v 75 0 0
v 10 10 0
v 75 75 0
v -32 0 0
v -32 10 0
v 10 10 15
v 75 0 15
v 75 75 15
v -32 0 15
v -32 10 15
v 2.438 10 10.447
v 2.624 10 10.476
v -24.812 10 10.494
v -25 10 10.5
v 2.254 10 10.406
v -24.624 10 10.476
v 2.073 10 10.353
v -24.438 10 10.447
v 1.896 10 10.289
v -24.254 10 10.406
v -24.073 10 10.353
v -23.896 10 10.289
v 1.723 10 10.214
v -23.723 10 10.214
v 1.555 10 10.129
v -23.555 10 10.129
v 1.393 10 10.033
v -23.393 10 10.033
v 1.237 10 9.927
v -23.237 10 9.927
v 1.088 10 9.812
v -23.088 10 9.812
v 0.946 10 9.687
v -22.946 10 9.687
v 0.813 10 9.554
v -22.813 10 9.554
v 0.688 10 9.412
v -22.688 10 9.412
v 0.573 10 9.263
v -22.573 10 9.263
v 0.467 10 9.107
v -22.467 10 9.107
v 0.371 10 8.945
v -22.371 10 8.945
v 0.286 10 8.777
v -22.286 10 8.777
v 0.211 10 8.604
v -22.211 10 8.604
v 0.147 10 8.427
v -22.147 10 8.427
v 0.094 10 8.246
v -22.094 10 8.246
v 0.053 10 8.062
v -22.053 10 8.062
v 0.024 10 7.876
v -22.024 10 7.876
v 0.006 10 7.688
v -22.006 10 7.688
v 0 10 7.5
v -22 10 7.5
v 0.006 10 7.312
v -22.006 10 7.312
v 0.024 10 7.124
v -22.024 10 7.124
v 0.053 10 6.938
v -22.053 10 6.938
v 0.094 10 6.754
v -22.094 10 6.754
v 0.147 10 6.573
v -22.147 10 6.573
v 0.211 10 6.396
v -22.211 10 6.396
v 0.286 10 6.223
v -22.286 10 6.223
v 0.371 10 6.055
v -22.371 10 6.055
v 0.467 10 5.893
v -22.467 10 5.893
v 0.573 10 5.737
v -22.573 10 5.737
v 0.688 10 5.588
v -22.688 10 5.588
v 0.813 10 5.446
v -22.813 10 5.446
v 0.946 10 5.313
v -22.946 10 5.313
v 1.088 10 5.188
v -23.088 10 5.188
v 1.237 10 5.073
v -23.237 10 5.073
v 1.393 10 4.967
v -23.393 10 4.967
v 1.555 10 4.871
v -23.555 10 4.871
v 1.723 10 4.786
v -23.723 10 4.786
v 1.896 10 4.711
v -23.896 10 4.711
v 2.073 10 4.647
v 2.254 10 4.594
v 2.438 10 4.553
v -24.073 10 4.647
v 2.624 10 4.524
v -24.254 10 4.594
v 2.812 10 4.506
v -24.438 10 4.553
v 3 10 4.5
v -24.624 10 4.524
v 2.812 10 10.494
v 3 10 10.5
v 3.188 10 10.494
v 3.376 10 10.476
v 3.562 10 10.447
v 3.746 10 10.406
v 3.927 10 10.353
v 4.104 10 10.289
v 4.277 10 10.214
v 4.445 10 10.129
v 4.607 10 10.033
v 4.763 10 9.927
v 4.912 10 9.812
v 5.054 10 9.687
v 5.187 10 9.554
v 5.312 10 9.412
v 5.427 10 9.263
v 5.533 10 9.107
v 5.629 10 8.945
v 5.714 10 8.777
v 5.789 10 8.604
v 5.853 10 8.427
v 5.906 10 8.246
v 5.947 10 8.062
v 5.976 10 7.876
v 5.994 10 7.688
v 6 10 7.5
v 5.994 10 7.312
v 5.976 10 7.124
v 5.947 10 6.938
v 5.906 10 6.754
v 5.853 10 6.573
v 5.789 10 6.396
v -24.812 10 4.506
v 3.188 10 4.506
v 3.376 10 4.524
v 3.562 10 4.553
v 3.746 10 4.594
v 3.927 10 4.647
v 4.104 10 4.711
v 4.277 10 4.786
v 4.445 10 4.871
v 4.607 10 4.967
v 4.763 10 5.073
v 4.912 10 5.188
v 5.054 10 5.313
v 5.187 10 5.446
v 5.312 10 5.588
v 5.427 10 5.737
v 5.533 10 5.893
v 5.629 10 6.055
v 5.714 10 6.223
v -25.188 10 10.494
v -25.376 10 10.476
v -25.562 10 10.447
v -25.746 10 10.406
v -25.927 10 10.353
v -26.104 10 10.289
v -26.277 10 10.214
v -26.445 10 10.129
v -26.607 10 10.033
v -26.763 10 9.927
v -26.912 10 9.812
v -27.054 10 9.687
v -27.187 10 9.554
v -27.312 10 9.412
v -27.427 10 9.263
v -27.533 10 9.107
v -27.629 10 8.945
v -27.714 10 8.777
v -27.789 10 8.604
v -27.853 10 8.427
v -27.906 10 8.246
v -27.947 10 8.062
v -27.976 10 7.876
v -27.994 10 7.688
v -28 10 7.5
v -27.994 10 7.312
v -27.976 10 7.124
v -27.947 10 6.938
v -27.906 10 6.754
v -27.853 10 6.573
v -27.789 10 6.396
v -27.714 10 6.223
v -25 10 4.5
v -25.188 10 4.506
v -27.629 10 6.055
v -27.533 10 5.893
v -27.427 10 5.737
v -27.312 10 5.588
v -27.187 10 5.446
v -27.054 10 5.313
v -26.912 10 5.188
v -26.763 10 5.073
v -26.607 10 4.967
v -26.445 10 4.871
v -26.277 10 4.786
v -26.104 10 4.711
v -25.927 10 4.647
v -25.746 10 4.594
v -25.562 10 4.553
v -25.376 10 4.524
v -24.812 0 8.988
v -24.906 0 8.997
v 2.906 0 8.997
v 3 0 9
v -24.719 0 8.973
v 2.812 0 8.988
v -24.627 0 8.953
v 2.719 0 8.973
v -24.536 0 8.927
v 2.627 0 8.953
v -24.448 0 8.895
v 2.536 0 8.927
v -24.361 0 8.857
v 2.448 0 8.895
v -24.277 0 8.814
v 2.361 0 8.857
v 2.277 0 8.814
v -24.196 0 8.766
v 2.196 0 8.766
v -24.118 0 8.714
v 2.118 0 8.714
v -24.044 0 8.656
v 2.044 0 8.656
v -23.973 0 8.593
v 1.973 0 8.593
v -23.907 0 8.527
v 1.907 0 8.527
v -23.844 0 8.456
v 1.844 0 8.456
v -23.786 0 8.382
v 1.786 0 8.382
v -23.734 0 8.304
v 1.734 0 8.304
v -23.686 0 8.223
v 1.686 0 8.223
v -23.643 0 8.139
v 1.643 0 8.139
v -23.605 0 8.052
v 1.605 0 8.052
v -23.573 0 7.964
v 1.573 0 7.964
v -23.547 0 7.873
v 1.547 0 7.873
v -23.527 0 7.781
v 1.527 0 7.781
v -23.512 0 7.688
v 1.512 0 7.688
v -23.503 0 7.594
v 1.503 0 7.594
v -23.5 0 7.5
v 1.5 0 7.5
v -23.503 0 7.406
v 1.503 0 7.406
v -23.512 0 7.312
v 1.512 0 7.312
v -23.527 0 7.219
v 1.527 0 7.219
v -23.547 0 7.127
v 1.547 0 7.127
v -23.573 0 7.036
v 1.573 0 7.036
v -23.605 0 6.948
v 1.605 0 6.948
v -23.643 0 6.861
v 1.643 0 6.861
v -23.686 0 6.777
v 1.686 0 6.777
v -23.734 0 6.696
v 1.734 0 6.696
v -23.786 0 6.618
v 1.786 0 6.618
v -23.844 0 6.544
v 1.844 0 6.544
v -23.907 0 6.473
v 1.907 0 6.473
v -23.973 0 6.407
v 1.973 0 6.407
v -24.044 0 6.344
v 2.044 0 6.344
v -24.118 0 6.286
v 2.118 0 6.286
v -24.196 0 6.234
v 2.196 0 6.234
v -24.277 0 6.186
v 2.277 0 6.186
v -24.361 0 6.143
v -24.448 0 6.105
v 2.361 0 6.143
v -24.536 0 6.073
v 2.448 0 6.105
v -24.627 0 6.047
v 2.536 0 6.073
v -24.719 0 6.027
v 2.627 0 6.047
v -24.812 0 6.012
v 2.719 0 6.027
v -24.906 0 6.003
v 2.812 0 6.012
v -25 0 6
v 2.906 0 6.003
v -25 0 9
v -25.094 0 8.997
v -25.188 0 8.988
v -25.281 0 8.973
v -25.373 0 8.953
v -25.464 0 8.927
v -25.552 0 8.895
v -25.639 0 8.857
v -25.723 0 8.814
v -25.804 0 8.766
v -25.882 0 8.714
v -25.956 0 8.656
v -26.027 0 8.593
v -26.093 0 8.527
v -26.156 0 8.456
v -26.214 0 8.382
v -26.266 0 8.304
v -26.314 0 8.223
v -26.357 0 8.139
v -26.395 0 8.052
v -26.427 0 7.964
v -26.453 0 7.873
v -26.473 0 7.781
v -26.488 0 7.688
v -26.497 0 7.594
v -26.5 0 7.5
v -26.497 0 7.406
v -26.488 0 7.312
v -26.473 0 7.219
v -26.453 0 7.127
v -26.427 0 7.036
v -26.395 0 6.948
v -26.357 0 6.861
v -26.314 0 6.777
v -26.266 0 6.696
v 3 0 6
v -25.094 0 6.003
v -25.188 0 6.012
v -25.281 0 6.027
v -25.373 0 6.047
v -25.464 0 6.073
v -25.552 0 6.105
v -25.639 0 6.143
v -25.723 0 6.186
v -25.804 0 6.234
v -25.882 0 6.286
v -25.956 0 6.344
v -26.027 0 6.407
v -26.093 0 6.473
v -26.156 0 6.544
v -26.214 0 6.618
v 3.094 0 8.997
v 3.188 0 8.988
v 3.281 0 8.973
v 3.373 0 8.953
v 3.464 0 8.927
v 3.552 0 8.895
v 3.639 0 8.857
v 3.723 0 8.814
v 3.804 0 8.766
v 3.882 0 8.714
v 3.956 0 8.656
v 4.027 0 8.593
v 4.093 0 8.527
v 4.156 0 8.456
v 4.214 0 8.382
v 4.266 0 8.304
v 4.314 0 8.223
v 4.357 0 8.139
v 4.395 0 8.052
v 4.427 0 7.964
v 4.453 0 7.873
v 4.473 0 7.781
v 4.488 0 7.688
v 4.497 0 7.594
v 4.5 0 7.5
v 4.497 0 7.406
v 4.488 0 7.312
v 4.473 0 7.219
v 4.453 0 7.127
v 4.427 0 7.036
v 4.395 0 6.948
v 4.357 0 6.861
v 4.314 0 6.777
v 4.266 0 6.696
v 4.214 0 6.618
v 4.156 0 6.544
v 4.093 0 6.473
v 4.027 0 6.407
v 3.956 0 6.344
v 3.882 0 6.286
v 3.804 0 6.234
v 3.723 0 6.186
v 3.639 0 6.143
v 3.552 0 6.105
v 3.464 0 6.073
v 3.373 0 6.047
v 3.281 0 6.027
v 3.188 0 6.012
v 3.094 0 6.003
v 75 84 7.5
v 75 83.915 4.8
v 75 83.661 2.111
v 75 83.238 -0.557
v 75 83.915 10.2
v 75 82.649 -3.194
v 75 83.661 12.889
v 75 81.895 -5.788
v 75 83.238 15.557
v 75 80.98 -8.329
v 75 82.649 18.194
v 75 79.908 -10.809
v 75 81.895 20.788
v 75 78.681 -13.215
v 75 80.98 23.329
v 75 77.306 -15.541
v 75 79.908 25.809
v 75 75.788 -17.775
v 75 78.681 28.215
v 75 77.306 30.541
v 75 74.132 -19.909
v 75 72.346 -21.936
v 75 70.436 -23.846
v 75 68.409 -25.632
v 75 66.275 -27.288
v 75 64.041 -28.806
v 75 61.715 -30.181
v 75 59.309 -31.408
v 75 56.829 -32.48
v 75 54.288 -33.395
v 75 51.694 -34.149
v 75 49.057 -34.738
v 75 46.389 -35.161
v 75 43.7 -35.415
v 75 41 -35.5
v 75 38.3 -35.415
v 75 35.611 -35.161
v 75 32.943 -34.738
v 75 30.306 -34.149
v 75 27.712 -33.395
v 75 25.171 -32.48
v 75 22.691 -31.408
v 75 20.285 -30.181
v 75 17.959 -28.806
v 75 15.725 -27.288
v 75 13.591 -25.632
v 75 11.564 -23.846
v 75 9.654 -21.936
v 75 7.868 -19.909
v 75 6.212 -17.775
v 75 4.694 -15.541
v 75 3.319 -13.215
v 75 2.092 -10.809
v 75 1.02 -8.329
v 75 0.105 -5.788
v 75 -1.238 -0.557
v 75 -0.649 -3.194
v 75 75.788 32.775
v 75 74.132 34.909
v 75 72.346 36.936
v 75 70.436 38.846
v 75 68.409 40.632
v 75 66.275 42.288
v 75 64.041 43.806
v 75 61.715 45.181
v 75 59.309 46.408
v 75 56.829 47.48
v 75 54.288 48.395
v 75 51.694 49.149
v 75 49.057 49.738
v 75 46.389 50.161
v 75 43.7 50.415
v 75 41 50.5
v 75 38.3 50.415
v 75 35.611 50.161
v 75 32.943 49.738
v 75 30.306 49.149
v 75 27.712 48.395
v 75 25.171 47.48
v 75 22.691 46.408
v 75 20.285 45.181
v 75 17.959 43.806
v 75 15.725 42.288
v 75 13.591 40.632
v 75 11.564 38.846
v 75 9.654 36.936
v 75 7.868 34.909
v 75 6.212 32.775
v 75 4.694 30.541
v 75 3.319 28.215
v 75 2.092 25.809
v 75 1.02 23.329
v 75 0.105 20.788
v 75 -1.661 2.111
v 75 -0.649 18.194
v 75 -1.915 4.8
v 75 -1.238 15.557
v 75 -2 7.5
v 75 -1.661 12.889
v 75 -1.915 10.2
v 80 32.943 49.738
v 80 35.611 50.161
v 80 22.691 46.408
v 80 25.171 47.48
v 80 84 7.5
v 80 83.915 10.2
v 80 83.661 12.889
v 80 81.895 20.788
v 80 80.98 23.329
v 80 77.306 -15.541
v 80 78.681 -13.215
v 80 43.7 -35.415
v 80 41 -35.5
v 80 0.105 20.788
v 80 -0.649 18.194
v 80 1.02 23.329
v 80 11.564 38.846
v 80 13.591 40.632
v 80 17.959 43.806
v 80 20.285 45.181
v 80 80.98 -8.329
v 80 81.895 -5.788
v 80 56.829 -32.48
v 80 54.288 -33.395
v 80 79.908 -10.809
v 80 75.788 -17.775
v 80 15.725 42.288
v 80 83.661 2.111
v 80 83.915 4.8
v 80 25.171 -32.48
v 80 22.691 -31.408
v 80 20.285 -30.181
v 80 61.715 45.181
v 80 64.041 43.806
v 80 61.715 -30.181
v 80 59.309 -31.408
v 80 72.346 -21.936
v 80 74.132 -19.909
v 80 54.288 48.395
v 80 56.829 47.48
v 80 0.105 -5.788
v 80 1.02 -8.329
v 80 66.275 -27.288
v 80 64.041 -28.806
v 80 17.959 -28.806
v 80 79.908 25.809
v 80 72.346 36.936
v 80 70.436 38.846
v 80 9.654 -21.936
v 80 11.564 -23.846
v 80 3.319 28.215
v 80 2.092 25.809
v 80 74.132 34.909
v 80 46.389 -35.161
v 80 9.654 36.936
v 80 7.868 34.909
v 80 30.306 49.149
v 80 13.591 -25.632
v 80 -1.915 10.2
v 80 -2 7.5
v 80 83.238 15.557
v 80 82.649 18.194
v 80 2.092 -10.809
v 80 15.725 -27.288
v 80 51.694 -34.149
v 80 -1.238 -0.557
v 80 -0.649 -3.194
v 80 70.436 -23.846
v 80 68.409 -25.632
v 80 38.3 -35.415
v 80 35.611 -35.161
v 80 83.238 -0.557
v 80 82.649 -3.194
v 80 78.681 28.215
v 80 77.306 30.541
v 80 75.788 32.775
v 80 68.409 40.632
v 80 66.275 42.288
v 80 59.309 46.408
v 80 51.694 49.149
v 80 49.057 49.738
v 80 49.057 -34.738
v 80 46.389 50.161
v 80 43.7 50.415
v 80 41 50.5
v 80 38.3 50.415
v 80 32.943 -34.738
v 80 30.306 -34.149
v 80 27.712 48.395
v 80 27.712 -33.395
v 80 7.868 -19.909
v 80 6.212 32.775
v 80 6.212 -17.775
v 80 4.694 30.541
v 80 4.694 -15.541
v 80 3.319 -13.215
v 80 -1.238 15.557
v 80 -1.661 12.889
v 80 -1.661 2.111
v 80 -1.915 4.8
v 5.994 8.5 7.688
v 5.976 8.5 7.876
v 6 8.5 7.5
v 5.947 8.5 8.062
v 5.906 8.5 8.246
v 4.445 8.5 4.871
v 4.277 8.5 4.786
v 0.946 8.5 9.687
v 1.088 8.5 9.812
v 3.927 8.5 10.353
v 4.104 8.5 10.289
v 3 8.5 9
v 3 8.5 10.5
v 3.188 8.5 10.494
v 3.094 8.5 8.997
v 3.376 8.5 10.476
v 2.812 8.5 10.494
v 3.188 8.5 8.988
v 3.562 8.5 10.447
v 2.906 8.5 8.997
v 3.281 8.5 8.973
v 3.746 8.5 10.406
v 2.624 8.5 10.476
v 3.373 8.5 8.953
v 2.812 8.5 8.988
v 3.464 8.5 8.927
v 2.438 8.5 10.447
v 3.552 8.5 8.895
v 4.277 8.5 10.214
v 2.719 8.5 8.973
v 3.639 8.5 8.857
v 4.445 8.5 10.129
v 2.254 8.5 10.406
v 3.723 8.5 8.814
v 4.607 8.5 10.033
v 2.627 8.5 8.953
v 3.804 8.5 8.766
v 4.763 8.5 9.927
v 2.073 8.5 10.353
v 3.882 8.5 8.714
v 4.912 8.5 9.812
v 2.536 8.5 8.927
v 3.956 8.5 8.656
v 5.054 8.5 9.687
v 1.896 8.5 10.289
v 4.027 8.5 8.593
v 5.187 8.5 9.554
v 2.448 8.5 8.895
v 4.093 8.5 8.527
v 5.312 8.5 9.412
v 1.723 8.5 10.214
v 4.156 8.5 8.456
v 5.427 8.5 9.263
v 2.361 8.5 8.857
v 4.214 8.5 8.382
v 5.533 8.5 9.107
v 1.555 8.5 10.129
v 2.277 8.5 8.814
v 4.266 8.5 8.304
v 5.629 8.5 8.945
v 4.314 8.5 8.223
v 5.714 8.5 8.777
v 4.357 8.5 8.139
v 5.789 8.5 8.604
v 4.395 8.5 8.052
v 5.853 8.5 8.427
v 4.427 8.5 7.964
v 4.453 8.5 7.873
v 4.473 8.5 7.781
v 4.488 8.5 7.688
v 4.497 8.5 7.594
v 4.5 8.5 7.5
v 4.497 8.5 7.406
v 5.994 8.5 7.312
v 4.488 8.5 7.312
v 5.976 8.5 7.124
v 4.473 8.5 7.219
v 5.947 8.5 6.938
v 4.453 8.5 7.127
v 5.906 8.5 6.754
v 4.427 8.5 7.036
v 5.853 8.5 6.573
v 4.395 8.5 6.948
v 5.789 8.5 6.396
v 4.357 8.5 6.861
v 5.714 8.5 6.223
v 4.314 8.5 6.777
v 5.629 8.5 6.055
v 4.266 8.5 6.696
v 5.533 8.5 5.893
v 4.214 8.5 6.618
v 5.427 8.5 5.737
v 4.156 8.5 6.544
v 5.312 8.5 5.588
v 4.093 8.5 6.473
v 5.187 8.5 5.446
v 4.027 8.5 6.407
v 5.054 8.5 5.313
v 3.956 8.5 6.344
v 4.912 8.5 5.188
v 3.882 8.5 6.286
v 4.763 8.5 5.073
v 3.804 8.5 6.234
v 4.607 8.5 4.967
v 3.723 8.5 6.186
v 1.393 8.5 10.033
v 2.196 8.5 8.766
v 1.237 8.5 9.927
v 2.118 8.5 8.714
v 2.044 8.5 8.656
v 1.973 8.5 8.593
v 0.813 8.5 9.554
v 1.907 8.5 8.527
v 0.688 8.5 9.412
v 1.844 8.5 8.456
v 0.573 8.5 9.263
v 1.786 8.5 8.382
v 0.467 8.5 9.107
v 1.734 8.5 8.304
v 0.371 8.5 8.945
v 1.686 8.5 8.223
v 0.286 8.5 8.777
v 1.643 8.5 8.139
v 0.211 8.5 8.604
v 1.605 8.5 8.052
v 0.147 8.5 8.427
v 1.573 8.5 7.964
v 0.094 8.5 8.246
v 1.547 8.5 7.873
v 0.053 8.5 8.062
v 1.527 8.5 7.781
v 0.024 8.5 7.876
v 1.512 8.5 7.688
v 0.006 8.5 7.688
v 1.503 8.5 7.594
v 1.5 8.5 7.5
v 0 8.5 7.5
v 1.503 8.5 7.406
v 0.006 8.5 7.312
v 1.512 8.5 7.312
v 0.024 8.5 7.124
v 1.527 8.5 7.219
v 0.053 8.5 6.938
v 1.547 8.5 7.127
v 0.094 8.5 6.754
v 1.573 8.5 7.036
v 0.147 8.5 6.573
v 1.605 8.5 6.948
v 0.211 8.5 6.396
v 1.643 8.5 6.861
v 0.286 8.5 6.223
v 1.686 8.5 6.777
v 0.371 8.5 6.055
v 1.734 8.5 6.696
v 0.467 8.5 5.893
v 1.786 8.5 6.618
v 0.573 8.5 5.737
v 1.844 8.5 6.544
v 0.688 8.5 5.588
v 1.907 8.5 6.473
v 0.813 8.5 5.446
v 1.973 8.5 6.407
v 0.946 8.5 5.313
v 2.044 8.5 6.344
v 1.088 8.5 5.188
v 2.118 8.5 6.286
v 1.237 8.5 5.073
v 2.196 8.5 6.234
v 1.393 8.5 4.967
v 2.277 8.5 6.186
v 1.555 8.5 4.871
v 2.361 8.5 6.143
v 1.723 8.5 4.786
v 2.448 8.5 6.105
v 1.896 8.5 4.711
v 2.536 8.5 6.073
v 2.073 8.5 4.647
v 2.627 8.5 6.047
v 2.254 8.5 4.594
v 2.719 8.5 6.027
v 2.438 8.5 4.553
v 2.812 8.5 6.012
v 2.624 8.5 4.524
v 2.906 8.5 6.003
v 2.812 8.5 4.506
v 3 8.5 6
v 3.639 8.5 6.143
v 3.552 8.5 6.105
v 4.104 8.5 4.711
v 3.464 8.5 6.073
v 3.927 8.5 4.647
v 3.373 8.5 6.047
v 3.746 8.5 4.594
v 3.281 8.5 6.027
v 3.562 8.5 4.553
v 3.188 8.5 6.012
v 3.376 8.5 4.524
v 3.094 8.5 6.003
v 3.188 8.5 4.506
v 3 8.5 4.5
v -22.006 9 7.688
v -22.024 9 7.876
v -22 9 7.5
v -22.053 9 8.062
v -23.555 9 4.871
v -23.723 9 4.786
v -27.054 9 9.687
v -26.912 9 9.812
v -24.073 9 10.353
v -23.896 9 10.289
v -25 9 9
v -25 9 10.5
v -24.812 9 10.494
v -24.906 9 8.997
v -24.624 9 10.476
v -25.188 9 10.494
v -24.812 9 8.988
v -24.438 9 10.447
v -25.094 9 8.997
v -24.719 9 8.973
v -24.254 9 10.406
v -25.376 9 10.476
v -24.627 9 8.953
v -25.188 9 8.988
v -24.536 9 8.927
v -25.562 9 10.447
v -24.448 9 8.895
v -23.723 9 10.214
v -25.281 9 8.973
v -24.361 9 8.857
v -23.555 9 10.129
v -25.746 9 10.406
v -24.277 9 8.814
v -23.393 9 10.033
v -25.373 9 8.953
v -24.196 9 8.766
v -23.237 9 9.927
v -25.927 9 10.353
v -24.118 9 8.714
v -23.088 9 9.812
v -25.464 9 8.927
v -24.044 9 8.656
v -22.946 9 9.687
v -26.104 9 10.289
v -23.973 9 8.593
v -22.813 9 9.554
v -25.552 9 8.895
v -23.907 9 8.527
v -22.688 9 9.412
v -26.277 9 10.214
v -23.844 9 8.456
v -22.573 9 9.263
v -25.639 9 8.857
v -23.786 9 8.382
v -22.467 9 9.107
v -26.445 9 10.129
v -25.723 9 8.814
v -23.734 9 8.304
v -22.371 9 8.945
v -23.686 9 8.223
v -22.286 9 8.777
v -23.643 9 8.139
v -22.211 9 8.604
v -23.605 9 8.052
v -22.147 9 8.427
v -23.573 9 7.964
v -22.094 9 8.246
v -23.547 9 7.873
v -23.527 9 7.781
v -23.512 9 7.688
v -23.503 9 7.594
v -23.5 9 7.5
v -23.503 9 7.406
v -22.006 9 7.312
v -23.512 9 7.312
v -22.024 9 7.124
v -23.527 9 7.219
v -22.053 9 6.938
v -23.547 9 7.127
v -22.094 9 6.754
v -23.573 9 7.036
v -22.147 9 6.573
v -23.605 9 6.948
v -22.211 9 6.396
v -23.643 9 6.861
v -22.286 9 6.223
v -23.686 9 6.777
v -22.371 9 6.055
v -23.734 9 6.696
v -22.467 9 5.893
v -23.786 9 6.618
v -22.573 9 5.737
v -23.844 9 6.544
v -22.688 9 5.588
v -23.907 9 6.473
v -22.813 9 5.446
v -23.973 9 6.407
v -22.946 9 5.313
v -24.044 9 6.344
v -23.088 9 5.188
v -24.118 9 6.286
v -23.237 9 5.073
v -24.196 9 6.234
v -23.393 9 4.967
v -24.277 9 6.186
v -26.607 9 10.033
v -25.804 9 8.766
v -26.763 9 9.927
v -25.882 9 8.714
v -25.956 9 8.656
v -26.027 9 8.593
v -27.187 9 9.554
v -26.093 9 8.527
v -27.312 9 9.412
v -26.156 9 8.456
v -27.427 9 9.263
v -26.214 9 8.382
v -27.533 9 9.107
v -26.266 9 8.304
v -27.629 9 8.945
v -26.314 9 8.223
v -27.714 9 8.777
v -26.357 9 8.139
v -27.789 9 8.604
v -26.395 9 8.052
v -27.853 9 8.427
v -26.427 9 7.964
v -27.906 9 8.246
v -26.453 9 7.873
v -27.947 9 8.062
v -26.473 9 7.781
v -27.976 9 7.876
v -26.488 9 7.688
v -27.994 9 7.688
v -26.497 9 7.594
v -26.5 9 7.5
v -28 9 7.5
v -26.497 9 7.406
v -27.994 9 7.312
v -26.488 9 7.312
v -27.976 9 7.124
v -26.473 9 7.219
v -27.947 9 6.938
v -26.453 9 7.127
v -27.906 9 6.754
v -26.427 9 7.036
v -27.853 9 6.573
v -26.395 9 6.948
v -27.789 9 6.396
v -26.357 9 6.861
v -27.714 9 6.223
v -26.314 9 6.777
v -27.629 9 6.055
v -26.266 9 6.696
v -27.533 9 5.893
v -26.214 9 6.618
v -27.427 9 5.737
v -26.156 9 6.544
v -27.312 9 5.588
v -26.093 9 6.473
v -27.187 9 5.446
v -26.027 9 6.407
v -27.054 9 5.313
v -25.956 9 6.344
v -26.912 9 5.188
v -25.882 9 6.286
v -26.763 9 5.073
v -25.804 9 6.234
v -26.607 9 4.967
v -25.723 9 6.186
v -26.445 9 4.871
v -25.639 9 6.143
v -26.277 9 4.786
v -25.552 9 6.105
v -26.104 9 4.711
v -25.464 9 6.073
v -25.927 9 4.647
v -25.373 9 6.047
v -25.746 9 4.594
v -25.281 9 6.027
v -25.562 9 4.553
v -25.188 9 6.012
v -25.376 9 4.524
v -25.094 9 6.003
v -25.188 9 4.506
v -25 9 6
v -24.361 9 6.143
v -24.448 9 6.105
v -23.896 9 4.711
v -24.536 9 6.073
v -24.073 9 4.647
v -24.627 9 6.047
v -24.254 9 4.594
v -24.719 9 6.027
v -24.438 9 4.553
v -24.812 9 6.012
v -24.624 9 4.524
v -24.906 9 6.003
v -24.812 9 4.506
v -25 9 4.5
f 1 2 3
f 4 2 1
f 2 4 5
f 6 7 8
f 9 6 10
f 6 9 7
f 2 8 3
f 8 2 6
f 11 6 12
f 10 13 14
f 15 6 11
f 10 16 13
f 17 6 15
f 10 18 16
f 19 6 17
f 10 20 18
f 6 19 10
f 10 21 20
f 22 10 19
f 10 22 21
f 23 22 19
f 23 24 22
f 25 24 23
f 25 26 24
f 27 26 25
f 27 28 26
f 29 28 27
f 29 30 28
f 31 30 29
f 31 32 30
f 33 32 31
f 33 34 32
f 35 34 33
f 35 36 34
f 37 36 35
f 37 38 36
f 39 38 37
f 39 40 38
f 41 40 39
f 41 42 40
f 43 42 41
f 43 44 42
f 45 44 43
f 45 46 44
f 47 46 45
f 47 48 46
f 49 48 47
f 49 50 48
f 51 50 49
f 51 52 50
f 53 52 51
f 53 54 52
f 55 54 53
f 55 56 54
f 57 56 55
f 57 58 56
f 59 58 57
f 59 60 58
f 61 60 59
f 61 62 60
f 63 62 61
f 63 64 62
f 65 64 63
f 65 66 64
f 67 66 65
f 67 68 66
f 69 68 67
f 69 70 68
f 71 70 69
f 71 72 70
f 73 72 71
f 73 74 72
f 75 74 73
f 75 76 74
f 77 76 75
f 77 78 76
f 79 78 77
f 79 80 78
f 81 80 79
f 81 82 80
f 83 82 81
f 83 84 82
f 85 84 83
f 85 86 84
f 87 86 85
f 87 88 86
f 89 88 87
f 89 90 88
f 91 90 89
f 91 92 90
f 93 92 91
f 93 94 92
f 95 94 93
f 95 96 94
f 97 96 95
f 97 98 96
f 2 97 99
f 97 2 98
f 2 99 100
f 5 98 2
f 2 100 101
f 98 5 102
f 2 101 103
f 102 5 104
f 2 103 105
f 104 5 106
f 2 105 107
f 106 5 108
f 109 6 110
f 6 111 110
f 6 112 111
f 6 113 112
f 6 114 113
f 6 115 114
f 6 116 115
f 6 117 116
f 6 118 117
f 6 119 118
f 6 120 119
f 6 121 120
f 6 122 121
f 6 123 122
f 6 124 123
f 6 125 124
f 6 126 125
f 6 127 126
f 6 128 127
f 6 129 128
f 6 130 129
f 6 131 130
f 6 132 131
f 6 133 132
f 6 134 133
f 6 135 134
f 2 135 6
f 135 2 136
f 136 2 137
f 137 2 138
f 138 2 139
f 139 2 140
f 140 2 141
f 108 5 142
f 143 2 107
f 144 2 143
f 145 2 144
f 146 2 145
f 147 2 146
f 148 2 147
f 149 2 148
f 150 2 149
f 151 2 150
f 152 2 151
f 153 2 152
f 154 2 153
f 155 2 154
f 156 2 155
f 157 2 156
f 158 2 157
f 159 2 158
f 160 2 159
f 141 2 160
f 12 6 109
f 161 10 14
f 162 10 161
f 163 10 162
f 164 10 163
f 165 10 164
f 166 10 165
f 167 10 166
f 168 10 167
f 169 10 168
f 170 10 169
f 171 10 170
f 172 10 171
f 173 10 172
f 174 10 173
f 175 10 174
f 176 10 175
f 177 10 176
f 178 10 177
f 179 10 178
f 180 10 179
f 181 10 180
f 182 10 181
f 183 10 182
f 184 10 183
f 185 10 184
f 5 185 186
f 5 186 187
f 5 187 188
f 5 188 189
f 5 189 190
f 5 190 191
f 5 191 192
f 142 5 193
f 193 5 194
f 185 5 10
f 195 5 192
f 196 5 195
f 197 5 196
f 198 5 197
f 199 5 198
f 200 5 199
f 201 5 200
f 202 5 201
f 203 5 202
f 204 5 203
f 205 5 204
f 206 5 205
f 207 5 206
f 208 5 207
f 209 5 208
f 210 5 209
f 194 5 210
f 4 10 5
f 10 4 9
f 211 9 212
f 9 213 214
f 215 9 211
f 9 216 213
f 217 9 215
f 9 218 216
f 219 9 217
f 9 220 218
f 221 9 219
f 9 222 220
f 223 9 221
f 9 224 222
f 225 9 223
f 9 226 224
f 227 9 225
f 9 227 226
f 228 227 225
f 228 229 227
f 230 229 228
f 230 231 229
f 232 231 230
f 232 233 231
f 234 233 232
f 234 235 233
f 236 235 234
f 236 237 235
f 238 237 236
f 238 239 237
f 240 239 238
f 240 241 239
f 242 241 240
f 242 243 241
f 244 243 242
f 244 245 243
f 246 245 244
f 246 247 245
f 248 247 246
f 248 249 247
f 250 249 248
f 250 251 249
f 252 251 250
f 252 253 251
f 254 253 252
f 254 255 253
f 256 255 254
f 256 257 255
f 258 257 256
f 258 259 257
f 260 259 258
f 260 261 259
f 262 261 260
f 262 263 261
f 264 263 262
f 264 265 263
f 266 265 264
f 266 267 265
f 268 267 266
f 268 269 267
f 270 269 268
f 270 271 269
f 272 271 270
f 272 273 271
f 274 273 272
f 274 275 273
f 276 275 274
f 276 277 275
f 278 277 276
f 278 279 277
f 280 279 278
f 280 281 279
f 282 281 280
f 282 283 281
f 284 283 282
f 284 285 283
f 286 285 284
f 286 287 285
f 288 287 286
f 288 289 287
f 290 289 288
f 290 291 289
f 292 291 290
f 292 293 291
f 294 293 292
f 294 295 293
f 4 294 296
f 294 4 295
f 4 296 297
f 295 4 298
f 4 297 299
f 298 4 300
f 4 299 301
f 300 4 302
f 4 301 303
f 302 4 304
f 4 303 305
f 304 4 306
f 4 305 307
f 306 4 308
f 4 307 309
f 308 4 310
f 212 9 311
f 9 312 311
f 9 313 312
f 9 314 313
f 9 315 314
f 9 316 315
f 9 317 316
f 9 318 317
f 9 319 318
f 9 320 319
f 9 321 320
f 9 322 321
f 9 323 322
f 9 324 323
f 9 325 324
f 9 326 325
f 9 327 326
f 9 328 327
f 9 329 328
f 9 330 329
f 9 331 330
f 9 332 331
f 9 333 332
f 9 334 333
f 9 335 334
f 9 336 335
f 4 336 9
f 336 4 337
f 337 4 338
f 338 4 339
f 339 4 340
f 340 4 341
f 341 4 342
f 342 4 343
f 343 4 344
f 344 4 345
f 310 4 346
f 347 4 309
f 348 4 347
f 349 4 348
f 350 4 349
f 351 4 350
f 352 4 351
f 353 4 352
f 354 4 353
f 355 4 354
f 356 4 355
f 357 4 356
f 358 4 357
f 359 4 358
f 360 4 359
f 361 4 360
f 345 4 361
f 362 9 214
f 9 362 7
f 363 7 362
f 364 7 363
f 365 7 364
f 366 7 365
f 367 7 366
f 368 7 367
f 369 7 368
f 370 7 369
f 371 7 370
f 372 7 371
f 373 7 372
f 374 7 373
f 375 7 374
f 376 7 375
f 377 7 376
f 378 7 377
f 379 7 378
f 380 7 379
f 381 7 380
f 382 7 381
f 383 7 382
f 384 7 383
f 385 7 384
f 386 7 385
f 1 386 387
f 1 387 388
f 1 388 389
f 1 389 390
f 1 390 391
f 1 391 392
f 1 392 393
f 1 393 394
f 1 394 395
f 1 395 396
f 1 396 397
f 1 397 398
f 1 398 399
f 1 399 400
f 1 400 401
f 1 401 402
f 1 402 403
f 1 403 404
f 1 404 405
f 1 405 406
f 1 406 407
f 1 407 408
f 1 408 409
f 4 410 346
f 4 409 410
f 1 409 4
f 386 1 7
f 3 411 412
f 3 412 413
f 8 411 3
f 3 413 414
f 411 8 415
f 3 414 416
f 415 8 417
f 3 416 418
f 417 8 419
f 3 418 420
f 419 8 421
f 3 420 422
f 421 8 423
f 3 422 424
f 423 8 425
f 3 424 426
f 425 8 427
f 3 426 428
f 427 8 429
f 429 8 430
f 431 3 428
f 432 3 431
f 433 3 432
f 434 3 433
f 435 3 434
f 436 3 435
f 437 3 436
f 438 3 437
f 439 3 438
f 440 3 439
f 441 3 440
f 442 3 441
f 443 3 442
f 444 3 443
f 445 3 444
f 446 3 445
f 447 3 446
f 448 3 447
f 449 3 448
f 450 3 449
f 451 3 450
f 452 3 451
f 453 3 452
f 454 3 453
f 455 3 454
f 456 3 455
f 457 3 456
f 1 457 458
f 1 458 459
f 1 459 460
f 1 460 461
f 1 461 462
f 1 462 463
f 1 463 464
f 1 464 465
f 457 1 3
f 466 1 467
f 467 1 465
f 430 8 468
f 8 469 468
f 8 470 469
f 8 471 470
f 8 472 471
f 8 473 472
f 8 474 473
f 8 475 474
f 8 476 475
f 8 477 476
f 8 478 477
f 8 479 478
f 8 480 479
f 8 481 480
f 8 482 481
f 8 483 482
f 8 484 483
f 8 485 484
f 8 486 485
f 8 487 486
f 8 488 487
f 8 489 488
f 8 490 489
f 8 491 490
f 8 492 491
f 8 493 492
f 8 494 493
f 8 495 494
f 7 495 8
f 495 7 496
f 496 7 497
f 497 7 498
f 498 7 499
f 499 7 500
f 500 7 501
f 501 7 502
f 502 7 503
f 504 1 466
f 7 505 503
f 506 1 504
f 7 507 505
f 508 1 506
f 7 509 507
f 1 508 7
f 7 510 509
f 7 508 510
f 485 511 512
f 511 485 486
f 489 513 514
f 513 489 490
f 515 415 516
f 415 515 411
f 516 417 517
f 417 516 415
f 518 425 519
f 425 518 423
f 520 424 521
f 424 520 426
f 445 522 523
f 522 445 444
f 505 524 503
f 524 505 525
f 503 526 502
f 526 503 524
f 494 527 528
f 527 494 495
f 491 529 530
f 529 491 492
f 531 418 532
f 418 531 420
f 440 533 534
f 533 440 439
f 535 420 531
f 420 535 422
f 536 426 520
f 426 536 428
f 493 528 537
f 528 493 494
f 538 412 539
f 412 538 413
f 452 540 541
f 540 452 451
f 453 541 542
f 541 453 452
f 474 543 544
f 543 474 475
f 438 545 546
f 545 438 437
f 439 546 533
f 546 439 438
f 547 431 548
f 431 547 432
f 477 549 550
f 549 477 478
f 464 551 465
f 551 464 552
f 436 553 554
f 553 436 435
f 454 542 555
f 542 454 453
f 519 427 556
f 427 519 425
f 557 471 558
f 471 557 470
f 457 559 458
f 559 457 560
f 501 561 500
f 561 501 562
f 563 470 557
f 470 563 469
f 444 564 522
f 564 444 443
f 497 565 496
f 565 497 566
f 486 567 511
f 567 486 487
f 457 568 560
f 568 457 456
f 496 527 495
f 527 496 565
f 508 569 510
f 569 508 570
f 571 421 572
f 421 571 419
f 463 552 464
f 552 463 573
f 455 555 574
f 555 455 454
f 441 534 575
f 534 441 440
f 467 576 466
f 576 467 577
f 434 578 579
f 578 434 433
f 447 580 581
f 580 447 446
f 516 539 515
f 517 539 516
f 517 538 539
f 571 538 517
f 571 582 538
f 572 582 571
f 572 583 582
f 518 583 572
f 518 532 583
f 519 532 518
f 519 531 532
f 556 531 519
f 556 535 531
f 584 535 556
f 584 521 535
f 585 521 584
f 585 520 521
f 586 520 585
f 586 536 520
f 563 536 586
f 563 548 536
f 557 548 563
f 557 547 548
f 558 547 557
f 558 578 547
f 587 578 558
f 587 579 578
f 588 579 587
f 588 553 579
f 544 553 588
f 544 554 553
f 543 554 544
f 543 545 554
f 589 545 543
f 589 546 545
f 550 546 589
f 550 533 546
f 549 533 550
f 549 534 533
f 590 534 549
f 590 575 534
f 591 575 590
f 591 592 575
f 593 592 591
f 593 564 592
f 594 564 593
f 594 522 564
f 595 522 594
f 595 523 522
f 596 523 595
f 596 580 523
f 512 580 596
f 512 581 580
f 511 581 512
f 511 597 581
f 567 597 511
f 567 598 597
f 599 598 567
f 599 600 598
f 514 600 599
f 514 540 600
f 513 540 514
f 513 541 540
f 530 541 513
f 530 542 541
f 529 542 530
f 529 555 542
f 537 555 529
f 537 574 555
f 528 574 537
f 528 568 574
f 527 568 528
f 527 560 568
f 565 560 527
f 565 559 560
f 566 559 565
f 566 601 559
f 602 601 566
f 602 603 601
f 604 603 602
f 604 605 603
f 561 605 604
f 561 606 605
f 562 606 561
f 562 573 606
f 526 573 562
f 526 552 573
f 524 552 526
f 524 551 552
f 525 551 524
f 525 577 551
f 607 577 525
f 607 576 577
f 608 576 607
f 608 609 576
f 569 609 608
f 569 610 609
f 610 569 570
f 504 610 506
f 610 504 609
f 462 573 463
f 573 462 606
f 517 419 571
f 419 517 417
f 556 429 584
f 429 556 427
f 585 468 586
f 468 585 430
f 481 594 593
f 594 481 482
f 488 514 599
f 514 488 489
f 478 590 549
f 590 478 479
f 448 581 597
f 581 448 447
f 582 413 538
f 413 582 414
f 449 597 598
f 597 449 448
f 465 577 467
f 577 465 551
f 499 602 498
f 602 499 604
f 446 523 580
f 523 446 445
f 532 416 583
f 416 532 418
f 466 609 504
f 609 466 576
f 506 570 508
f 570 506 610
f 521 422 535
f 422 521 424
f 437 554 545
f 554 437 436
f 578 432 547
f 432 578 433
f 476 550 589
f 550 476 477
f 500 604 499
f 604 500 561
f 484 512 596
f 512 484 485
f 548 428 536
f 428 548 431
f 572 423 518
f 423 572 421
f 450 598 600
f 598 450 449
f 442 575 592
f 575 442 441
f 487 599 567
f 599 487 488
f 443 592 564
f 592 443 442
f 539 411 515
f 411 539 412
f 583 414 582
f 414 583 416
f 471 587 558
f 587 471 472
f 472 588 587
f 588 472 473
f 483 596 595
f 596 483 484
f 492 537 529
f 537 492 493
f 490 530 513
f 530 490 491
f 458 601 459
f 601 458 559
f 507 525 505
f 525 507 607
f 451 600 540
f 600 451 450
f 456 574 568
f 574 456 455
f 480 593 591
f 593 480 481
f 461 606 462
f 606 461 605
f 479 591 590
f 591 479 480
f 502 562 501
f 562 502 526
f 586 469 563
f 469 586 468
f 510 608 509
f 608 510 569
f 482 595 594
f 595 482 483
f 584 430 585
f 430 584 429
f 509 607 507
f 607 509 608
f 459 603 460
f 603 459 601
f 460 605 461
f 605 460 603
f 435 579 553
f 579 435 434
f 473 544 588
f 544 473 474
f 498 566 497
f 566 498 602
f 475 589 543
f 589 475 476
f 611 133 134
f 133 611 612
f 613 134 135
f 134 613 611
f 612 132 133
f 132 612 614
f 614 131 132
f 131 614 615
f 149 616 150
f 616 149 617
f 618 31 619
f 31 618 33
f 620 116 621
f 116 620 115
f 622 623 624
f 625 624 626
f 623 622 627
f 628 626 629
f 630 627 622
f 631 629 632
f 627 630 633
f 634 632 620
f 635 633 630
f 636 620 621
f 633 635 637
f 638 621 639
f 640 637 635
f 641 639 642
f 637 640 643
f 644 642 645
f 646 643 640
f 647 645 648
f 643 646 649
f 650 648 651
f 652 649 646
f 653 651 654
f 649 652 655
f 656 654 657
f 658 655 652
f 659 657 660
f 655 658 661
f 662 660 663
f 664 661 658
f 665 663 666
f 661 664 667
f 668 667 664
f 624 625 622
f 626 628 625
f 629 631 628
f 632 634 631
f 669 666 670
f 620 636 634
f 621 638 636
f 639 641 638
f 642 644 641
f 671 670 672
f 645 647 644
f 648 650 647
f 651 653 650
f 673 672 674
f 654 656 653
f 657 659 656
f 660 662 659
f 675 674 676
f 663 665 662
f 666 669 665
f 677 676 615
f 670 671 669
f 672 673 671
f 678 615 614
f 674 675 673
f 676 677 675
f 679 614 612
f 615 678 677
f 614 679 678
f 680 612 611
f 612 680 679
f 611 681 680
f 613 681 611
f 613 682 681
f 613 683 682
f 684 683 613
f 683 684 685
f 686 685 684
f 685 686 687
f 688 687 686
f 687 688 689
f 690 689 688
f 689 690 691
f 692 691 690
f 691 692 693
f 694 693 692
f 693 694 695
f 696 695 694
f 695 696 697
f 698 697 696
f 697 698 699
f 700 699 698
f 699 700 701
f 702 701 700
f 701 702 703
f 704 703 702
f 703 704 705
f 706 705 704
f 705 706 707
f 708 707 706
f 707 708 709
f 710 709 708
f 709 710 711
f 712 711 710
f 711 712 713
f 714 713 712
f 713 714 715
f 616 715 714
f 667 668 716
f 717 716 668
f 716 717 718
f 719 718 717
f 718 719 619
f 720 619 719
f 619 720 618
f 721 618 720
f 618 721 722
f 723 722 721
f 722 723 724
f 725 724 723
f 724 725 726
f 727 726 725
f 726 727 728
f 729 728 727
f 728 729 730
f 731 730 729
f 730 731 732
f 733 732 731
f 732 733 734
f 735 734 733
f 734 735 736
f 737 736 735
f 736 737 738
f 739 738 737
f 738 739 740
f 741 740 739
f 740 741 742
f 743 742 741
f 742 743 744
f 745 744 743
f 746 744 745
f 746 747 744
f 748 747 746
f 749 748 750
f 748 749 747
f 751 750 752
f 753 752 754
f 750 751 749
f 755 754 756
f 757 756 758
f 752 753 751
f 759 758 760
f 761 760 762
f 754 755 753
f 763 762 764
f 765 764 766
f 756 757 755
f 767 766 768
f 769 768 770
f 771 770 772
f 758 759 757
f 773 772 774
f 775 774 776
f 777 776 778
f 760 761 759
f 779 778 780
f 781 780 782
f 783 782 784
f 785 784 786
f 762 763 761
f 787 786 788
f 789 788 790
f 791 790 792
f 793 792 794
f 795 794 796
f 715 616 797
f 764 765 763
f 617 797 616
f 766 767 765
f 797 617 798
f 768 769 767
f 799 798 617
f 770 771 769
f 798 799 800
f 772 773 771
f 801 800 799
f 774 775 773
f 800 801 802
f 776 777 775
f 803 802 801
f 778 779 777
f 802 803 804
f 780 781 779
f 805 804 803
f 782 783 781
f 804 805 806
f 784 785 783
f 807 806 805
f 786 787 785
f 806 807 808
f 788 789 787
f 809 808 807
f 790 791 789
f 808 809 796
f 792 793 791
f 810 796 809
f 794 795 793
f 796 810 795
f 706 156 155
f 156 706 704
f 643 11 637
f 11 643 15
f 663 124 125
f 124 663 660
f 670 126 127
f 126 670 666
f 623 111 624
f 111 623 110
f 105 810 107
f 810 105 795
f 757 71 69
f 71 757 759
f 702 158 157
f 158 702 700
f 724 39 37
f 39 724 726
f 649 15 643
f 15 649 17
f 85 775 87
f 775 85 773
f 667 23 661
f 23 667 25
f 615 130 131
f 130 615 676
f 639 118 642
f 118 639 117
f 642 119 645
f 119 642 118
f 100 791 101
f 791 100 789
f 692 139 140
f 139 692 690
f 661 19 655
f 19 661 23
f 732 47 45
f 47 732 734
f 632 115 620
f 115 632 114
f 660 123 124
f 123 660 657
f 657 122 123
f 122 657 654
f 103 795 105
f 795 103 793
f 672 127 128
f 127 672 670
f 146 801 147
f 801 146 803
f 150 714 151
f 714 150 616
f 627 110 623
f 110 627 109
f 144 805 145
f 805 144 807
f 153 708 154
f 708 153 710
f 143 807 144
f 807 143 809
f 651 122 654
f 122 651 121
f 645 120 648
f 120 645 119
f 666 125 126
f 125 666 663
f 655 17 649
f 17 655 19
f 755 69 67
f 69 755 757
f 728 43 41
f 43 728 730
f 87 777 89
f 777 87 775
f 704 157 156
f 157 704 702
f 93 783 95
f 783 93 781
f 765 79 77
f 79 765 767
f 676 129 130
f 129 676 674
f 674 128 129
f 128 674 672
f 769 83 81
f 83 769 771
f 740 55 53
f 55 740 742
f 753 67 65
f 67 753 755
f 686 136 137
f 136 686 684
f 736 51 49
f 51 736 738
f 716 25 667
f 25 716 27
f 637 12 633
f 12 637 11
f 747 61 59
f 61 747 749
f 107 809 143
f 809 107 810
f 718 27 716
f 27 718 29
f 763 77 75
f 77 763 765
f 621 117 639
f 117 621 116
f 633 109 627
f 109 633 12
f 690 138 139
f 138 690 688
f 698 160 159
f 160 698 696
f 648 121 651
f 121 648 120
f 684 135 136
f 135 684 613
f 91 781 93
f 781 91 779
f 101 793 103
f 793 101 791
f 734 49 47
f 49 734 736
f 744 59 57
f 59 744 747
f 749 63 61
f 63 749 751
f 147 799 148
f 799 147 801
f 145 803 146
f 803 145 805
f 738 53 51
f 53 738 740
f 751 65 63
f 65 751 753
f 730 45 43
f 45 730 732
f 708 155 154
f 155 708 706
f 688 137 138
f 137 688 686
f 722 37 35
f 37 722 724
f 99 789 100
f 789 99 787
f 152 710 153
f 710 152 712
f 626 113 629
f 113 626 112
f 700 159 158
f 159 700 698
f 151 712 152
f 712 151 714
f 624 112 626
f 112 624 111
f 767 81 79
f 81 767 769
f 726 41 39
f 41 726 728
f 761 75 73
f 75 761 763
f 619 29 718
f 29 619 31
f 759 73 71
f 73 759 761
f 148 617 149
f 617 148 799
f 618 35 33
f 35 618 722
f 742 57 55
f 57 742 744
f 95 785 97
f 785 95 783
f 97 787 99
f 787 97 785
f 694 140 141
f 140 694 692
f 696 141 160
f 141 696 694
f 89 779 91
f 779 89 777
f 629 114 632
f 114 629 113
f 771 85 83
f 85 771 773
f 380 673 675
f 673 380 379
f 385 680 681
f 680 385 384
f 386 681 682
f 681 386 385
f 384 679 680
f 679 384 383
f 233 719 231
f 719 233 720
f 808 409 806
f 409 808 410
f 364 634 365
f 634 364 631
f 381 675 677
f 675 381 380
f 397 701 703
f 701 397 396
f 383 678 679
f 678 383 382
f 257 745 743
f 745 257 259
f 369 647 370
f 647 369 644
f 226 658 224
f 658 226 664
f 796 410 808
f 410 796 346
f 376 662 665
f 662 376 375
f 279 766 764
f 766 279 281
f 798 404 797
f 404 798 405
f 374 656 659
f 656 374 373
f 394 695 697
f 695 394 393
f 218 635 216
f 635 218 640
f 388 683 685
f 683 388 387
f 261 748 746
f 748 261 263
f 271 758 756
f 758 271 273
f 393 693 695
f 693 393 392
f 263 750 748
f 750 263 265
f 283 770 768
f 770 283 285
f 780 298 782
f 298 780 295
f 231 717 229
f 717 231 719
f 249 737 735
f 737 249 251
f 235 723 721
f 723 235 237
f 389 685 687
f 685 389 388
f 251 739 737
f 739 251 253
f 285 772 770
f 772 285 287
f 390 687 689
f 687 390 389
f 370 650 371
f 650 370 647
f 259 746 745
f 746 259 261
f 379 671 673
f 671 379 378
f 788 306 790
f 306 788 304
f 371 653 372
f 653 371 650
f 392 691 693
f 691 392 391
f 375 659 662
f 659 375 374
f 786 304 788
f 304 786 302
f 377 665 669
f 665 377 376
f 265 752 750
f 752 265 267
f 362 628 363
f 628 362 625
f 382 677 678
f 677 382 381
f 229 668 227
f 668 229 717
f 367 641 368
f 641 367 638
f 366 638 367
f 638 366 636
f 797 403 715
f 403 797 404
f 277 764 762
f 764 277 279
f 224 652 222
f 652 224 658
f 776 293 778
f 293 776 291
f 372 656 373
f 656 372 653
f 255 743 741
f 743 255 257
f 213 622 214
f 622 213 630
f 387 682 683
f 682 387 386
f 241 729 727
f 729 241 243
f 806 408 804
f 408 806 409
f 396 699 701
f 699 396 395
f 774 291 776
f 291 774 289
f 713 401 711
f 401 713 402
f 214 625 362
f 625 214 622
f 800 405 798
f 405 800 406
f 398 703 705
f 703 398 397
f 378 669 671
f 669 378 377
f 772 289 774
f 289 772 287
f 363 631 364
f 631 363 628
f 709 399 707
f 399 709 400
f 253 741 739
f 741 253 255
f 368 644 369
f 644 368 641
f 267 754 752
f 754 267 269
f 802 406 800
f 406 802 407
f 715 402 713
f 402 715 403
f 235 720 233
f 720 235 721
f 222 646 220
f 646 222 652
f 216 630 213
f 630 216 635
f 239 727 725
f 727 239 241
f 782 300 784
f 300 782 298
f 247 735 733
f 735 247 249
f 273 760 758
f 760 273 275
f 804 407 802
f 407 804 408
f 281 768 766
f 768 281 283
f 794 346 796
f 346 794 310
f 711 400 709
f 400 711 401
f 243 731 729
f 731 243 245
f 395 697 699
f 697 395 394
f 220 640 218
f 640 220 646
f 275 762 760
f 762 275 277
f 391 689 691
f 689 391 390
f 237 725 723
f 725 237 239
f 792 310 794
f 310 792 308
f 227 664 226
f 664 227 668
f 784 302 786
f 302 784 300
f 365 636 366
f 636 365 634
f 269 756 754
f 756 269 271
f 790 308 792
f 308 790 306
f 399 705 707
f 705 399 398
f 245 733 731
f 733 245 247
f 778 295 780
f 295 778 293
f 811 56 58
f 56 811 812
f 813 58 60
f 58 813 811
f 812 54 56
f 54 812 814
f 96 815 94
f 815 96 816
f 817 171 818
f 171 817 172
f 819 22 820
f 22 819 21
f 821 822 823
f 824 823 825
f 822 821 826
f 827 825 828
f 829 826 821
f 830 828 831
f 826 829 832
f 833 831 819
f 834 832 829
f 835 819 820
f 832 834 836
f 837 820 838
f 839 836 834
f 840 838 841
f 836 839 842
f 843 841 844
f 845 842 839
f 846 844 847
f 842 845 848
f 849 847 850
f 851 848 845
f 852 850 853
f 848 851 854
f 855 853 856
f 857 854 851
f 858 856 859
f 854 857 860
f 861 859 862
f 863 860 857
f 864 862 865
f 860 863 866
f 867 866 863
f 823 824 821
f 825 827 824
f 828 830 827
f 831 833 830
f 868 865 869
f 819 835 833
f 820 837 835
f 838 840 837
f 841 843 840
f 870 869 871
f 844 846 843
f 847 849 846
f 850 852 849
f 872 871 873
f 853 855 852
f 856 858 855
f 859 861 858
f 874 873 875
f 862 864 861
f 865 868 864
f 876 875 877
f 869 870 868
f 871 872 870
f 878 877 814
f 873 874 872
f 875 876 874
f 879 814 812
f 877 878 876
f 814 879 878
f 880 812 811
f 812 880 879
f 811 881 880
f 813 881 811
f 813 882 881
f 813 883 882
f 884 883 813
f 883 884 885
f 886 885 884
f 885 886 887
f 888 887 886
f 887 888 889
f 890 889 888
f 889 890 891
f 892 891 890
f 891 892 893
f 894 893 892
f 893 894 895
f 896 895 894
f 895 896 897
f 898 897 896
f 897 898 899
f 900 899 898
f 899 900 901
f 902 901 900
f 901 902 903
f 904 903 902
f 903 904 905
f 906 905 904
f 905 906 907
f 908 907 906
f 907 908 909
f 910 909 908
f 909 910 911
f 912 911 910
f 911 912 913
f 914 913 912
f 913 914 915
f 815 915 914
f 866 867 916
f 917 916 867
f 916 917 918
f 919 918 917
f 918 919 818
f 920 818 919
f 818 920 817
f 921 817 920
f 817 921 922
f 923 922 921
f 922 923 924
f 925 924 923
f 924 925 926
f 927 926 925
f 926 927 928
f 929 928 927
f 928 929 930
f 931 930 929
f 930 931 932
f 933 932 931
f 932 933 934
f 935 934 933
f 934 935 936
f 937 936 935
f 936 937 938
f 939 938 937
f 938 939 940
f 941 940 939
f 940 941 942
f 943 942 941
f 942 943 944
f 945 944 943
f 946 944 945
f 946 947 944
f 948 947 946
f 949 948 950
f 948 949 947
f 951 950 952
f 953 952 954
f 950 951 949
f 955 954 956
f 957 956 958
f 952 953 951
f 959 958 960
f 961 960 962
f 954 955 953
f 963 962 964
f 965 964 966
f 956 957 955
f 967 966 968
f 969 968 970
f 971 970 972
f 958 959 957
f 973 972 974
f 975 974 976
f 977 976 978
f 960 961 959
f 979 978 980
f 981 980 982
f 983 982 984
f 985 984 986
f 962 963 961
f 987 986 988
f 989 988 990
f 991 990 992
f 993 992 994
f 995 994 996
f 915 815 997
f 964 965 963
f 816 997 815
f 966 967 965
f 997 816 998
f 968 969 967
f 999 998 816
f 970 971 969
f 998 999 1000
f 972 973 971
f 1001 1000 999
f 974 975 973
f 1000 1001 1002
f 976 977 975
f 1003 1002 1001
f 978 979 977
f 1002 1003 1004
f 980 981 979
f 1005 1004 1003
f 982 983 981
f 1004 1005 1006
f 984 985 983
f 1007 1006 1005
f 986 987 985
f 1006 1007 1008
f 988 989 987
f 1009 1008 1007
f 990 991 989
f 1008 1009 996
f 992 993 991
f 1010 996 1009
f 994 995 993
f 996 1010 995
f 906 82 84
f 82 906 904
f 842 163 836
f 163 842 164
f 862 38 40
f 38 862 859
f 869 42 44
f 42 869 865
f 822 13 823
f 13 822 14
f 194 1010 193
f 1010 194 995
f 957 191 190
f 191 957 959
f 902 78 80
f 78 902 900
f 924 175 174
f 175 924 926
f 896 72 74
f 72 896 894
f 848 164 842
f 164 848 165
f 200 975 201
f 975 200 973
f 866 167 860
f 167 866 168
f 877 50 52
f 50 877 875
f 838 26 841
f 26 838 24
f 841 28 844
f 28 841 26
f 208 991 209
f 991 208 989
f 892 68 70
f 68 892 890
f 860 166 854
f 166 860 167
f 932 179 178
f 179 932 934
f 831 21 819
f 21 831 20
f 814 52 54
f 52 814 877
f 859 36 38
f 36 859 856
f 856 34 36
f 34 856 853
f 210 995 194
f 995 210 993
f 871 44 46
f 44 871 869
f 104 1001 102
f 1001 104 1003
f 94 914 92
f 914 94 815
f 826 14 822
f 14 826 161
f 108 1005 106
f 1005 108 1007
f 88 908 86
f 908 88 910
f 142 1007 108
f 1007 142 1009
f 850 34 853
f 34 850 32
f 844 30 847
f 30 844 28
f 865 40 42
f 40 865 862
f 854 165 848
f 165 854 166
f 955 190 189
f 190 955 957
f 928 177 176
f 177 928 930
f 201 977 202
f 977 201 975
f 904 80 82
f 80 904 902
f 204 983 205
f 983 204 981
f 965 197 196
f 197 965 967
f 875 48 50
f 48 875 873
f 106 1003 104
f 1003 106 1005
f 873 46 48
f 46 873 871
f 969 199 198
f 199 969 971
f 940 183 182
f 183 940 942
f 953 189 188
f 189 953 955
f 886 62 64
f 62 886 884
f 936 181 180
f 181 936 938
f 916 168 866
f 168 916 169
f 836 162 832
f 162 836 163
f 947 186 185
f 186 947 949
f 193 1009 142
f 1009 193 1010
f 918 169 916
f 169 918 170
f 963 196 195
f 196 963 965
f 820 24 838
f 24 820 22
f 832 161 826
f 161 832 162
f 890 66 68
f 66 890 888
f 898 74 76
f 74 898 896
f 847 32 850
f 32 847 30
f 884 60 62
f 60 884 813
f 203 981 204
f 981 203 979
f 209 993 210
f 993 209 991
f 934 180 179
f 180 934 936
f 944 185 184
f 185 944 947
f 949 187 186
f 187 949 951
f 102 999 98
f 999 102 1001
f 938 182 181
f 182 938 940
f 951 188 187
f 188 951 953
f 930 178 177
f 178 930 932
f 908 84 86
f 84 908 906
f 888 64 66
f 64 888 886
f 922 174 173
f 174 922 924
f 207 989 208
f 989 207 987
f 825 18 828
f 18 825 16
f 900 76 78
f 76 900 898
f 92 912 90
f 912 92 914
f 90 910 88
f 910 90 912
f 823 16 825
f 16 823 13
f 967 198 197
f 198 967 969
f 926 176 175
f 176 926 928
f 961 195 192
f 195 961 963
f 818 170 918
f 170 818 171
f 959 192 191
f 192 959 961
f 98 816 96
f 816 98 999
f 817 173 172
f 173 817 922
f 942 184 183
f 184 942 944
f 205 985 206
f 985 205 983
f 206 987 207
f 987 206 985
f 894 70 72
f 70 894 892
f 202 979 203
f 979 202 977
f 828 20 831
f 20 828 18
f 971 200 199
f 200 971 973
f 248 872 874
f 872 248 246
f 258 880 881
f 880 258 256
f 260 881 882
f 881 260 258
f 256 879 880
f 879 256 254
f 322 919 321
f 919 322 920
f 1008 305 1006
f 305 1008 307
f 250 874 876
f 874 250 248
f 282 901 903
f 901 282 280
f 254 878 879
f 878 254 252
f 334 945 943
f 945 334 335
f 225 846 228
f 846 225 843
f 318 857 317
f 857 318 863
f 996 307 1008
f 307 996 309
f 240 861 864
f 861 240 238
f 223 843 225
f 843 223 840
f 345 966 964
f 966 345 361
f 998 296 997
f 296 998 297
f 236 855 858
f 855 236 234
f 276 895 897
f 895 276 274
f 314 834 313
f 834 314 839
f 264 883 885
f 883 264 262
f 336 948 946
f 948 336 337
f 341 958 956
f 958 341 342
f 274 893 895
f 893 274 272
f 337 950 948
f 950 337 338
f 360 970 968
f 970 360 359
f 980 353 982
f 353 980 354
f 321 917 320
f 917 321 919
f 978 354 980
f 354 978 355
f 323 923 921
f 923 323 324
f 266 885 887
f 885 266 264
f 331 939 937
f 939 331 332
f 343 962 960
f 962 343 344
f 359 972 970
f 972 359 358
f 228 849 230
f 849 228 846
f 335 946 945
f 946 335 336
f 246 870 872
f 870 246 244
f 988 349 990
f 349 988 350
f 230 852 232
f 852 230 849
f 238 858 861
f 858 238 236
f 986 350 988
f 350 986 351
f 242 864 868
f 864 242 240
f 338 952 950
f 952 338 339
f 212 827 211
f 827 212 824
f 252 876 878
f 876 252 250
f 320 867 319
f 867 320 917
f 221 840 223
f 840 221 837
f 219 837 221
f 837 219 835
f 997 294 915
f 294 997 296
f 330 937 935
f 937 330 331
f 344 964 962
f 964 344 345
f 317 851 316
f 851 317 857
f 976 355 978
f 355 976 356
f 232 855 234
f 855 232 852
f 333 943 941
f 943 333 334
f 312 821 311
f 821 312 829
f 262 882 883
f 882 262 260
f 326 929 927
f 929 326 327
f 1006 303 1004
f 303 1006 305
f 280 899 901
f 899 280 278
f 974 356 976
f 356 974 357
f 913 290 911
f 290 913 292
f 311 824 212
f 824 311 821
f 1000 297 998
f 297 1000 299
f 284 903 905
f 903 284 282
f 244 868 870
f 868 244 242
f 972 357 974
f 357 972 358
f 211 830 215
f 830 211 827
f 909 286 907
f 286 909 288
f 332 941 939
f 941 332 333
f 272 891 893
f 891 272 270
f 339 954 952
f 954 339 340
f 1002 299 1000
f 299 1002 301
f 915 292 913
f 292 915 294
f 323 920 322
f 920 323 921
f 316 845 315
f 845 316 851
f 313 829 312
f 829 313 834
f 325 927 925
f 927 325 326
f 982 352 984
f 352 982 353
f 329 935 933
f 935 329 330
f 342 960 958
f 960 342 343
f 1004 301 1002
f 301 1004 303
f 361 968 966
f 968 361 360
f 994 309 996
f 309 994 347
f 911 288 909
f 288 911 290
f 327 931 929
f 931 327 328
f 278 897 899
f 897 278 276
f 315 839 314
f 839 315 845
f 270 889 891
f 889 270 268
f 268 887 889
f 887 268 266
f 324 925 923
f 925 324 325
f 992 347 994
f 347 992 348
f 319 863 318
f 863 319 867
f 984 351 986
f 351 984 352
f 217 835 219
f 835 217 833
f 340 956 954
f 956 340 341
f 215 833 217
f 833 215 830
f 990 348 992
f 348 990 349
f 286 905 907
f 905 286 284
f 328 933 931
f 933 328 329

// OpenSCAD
/*
Copyright Dr. Mrs. The Mistress 2020.
This documentation describes Open Hardware and is licensed under the CERN OHL v. 1.2.

You may redistribute and modify this documentation under the terms of the
CERN OHL v.1.2. (http://ohwr.org/cernohl). This documentation is distributed
WITHOUT   ANY   EXPRESS   OR   IMPLIED   WARRANTY,   INCLUDING   OF
MERCHANTABILITY,   SATISFACTORY   QUALITY   AND   FITNESS   FOR   A
PARTICULAR   PURPOSE.   Please   see   the   CERN   OHL   v.1.2  for   applicable
conditions.
*/

difference() {
	union() {
		linear_extrude(15){
			union(){
				polygon( points=[[0,0],[75,75],[75,0]]);
				translate([-32,0,0])
				square([42,10]);
			}
		}

		translate([75,41,7.5])
		rotate([0,90,0])
		cylinder(h=5, r=43, $fn=100);
	}

	translate([3,10,7.5]){
		rotate([90,0,0])
		union() {
			cylinder(h=1.5, d=6, $fn=100);
			cylinder(h=10, d=3, $fn=100);
		}
	}

	translate([-25,10,7.5]){
		rotate([90,0,0])
		union() {
			cylinder(h=1, d=6, $fn=100);
			cylinder(h=10, d=3, $fn=100);
		}
	}
}
